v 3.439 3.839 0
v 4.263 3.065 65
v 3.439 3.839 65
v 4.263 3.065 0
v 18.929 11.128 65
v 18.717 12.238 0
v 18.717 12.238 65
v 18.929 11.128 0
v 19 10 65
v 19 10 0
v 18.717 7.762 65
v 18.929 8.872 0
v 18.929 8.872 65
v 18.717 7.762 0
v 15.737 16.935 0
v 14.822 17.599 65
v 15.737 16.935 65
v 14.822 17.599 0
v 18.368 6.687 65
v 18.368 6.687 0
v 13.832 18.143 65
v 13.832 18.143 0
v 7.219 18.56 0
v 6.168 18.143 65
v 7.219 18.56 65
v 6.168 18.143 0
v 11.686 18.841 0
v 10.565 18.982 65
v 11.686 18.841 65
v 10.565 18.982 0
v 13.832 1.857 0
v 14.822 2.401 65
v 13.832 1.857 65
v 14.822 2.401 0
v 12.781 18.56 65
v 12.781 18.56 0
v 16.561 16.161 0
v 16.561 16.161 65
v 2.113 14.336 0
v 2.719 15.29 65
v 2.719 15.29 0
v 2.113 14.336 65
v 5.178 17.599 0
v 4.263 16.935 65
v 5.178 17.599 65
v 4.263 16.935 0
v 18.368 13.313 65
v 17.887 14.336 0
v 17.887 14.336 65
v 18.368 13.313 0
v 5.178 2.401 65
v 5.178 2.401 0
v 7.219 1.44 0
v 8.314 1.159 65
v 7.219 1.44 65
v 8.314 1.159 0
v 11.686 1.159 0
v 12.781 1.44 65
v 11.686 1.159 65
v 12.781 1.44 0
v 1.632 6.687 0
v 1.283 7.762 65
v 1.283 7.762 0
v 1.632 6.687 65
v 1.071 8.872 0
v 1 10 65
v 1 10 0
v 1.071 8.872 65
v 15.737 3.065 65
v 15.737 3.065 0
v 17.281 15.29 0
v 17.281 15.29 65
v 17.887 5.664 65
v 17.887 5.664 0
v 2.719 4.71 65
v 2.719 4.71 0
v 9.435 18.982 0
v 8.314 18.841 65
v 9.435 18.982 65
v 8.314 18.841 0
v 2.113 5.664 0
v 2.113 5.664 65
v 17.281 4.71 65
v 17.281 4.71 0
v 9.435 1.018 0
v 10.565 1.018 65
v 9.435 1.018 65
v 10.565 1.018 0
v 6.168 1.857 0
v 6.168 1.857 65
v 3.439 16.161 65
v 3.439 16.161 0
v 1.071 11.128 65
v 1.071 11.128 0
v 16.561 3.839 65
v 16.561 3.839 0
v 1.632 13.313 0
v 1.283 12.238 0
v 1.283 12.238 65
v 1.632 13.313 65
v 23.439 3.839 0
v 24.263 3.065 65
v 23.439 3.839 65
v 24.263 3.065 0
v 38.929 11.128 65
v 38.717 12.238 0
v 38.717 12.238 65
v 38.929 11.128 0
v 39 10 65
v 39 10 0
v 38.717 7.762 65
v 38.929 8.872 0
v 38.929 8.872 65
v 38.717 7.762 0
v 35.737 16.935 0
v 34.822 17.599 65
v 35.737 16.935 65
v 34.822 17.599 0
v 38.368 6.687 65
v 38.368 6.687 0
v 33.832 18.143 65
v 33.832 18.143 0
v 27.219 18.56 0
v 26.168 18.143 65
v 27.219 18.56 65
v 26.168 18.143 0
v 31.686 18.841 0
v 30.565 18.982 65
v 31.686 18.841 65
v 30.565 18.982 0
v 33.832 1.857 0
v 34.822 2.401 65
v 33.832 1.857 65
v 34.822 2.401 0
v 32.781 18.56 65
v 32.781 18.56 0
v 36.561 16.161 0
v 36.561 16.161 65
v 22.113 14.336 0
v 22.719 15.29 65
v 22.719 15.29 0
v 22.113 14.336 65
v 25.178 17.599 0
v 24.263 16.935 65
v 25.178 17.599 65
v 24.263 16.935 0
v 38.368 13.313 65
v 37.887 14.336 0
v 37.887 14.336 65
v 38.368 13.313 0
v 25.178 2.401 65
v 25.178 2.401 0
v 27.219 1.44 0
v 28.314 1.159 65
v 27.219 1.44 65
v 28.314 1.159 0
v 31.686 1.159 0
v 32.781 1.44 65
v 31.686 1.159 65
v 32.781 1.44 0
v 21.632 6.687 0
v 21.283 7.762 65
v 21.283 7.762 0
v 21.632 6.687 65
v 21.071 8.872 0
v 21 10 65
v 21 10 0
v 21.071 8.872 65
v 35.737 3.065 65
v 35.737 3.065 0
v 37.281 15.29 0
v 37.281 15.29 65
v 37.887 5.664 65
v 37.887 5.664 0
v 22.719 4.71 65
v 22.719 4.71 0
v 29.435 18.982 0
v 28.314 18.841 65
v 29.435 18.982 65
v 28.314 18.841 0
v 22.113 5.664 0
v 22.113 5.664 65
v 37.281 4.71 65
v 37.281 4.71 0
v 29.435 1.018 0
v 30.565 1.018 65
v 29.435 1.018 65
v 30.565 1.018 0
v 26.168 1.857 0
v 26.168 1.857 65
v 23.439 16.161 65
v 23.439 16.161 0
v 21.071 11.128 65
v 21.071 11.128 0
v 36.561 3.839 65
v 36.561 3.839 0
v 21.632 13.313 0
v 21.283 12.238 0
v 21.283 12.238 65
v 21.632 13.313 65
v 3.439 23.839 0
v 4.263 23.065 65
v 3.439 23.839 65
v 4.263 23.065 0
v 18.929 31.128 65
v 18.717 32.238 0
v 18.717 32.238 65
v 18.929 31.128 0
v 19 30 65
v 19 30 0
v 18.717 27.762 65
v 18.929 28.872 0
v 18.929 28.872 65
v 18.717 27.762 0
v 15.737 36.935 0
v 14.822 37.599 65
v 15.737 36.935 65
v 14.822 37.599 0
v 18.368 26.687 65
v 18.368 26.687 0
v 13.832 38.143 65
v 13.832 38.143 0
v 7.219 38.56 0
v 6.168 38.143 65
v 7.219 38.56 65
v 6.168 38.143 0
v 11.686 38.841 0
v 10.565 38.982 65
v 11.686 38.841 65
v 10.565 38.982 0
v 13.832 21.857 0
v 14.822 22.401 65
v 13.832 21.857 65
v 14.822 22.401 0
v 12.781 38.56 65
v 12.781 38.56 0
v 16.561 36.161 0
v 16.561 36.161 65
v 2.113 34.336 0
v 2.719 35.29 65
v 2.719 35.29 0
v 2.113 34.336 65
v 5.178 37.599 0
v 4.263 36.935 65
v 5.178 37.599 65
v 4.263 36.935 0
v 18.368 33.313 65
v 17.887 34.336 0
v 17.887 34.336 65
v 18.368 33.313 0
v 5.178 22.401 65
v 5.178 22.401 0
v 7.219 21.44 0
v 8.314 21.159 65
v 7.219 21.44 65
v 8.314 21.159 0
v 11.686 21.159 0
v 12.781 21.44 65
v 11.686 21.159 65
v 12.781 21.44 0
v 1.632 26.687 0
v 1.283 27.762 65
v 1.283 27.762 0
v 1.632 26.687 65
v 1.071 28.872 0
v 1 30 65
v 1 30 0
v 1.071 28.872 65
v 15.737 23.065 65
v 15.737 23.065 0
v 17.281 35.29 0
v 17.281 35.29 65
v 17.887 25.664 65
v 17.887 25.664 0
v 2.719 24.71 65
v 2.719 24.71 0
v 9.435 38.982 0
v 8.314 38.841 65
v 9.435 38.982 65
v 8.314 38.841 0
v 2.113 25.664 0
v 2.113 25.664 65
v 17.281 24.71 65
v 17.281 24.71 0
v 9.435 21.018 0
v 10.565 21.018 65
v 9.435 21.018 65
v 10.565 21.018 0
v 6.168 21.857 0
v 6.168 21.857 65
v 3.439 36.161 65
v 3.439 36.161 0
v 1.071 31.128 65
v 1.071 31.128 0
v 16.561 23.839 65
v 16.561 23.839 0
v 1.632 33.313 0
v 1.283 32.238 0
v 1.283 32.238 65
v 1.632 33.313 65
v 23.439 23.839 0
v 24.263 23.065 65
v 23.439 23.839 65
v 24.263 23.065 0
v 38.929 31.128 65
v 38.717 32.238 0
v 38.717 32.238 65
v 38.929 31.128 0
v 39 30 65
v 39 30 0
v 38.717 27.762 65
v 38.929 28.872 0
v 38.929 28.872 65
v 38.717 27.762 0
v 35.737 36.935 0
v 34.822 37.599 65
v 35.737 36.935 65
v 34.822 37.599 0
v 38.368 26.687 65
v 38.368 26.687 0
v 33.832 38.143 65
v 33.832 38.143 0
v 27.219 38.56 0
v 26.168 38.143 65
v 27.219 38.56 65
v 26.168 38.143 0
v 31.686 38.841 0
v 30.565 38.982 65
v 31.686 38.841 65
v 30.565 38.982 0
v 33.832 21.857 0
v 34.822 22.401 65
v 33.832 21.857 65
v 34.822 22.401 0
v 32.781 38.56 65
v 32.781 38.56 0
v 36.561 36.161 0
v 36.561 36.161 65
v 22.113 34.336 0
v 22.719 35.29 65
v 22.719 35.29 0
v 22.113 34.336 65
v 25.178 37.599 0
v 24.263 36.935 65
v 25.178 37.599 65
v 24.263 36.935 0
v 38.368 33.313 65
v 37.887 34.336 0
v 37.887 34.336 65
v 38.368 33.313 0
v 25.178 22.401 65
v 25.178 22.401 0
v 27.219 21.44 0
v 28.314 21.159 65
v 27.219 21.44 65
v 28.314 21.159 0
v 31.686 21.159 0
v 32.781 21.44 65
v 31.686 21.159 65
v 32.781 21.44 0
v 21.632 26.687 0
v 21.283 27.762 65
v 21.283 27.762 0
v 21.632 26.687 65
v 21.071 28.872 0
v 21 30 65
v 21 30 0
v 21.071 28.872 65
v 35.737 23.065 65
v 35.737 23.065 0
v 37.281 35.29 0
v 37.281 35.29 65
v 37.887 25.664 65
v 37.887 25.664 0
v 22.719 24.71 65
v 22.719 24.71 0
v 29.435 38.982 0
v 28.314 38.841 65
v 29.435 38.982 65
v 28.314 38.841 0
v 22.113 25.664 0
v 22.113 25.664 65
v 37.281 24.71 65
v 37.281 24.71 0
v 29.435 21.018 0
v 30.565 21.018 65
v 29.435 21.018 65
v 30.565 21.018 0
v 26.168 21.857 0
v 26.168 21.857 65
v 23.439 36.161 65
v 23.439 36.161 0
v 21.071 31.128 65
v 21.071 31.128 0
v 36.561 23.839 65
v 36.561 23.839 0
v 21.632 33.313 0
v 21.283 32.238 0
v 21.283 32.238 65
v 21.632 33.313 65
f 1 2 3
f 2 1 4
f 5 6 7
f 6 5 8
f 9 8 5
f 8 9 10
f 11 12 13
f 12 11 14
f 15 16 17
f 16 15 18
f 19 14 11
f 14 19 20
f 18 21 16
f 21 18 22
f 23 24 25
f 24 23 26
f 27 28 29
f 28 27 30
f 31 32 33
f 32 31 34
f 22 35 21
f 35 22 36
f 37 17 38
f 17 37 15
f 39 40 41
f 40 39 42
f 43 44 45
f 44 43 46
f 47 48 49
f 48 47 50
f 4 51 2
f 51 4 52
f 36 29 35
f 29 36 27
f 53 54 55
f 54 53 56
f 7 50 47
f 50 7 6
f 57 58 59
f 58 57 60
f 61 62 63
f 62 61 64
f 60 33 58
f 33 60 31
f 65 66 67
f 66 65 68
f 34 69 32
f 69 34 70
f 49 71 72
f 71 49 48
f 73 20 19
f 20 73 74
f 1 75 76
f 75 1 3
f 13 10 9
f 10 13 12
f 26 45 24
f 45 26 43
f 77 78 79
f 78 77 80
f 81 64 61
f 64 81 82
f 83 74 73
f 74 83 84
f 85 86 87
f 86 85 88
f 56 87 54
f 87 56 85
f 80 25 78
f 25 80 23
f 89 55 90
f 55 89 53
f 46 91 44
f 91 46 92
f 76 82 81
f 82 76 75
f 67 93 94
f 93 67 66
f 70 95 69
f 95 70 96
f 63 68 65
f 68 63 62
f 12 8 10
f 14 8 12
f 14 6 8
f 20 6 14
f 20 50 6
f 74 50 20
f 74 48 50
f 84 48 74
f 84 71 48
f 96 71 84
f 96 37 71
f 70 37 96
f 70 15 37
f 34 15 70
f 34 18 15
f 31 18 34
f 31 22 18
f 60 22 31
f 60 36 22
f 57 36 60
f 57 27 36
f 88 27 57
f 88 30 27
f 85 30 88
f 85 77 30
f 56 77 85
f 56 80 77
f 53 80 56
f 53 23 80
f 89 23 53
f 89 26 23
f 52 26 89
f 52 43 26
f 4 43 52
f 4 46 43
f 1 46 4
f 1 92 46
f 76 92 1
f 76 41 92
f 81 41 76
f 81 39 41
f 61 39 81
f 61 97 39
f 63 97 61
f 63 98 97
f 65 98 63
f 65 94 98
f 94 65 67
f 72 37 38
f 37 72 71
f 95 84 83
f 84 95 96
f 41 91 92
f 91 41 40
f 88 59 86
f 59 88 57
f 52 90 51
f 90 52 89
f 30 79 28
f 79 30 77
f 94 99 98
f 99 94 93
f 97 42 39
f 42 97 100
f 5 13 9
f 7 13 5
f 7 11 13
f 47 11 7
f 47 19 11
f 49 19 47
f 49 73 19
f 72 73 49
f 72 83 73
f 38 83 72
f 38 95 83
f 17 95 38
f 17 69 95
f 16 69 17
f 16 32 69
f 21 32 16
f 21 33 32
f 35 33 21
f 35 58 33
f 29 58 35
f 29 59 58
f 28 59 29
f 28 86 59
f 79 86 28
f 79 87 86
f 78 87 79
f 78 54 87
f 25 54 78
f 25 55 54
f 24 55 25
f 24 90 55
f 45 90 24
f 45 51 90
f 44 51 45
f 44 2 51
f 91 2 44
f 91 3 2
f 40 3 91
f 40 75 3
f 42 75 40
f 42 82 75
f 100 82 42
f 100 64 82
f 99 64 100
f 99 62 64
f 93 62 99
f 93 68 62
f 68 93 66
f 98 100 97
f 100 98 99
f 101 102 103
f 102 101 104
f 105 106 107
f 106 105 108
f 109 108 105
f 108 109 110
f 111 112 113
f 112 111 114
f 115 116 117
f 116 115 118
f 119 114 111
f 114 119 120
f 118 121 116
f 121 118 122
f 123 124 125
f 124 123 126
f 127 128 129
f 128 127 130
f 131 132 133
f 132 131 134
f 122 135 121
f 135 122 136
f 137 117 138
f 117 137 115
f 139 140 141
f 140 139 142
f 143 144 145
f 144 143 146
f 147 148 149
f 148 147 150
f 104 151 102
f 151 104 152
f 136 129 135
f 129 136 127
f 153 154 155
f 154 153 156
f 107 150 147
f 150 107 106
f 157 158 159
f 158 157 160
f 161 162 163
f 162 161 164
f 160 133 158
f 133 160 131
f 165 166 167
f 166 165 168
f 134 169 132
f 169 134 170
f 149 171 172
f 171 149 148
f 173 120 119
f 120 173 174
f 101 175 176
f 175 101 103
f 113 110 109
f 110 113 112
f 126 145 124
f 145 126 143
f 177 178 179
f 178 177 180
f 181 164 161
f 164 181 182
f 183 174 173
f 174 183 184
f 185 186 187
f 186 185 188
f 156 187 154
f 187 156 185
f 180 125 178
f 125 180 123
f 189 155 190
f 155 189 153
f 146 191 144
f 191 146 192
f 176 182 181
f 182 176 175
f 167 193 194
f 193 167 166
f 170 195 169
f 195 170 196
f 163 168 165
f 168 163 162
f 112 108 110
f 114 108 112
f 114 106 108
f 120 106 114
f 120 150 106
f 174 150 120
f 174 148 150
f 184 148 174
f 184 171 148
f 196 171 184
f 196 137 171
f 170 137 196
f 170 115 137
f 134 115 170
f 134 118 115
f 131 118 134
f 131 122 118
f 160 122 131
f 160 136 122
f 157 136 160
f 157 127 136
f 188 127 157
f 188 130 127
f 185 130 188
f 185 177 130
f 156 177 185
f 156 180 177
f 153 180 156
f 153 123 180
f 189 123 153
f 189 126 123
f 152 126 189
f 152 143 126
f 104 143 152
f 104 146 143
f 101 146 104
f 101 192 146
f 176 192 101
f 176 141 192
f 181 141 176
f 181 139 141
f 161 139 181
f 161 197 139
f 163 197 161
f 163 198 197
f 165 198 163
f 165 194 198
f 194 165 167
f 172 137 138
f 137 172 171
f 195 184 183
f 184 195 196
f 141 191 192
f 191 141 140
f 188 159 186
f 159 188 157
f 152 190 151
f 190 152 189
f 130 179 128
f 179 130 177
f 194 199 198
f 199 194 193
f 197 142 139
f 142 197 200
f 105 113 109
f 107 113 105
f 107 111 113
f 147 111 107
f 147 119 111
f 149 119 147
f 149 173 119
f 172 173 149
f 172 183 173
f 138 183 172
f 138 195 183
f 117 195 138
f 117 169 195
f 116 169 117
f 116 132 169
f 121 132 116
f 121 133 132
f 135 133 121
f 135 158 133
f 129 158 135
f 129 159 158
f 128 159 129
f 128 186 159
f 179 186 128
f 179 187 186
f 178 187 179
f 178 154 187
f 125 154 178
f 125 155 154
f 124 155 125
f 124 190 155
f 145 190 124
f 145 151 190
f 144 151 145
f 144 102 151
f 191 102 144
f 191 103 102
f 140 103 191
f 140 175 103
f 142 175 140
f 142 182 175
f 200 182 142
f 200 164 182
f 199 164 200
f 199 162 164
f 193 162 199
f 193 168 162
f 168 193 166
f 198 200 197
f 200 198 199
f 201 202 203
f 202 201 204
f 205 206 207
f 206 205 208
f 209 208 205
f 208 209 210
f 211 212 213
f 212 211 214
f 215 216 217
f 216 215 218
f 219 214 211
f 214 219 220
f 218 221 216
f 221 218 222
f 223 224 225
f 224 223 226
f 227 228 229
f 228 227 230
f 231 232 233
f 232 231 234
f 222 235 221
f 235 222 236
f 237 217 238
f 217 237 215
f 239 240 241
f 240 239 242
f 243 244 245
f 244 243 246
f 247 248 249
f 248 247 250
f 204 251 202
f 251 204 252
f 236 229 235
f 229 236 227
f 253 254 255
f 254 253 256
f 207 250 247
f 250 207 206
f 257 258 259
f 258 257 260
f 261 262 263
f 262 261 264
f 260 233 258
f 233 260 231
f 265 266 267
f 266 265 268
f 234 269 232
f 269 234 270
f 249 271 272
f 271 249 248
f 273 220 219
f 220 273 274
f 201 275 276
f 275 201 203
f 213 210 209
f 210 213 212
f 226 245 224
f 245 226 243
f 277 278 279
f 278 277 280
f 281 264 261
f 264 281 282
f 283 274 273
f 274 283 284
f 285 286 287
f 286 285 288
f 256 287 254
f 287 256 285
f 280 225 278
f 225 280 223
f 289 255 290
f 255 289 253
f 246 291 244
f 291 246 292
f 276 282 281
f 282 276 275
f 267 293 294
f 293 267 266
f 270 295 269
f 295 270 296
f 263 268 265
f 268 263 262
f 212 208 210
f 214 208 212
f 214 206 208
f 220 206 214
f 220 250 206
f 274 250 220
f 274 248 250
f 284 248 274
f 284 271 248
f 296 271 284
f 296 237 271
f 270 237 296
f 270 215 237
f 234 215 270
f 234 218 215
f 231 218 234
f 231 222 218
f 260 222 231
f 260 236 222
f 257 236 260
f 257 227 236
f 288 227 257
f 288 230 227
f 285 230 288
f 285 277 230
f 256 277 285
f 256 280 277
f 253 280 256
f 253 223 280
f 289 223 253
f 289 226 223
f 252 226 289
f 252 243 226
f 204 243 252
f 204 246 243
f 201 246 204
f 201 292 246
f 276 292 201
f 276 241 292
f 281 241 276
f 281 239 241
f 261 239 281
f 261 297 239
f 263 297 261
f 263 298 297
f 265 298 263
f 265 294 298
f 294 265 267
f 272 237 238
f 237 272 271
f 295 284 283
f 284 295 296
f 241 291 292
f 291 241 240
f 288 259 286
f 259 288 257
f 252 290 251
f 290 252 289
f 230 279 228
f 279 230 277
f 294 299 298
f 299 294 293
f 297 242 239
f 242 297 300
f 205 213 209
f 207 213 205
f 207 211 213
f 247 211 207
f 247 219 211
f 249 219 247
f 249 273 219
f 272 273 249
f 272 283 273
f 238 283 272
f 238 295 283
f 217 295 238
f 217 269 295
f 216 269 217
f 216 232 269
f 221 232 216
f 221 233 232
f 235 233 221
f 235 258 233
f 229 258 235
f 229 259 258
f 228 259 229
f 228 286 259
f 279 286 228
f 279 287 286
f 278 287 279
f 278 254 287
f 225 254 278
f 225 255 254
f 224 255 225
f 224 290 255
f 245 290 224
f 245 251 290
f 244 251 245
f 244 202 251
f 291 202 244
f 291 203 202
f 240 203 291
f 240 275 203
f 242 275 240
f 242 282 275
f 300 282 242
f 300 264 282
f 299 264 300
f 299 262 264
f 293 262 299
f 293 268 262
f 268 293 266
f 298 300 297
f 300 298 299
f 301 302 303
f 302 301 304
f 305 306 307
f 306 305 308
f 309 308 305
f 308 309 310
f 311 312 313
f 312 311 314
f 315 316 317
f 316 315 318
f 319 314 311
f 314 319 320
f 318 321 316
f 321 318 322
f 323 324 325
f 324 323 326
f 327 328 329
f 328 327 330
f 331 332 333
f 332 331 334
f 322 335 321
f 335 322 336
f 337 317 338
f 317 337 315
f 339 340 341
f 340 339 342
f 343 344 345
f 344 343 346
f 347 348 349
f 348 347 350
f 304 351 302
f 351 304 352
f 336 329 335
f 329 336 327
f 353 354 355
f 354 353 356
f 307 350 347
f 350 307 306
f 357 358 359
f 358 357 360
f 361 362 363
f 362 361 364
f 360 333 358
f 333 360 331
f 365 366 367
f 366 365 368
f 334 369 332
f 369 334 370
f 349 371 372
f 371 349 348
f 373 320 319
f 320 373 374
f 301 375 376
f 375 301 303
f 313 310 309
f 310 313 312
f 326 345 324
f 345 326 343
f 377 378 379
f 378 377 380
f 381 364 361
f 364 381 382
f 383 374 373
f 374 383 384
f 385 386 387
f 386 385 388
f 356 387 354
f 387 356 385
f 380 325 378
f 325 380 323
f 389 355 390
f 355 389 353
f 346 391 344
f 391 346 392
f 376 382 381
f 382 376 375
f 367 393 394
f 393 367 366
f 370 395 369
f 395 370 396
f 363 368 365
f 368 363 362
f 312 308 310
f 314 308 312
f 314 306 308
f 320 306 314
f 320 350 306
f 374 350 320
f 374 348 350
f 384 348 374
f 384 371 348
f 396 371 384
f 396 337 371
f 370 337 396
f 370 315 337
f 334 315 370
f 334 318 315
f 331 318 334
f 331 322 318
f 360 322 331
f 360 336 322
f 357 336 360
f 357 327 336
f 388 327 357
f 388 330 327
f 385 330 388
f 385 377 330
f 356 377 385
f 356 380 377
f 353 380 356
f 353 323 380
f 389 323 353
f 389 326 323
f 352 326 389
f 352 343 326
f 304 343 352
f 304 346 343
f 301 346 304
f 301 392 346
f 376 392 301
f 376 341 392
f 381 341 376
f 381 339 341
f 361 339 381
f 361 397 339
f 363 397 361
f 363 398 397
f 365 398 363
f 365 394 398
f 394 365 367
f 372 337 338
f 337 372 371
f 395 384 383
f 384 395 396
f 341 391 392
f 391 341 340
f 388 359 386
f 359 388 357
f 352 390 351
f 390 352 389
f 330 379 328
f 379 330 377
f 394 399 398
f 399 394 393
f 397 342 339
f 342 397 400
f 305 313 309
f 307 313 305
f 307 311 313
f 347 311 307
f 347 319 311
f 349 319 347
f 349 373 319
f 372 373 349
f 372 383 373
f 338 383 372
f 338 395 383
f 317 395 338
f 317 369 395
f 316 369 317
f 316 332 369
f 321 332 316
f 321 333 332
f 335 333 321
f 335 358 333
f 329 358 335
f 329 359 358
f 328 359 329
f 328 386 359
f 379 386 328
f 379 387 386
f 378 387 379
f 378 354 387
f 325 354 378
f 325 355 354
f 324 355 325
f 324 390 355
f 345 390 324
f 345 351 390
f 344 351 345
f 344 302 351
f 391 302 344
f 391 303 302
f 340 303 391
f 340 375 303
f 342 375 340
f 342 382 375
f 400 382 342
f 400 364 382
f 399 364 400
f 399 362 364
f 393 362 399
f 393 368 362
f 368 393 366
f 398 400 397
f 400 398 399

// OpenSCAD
module batt1865(x,y){
    translate([0,0,65/2])cylinder(65, r=9,center=true,$fn=50);
}

module batt2170(x,y){
    translate([0,0,65/2])cylinder(65, r=9,center=true,$fn=50);
}

module batt2665(x,y){
    translate([0,0,65/2])cylinder(65, r=9,center=true,$fn=50);
}

translate([10,10,0])batt1865();
translate([30,10,0])batt1865();
translate([10,30,0])batt1865();
translate([30,30,0])batt1865();
